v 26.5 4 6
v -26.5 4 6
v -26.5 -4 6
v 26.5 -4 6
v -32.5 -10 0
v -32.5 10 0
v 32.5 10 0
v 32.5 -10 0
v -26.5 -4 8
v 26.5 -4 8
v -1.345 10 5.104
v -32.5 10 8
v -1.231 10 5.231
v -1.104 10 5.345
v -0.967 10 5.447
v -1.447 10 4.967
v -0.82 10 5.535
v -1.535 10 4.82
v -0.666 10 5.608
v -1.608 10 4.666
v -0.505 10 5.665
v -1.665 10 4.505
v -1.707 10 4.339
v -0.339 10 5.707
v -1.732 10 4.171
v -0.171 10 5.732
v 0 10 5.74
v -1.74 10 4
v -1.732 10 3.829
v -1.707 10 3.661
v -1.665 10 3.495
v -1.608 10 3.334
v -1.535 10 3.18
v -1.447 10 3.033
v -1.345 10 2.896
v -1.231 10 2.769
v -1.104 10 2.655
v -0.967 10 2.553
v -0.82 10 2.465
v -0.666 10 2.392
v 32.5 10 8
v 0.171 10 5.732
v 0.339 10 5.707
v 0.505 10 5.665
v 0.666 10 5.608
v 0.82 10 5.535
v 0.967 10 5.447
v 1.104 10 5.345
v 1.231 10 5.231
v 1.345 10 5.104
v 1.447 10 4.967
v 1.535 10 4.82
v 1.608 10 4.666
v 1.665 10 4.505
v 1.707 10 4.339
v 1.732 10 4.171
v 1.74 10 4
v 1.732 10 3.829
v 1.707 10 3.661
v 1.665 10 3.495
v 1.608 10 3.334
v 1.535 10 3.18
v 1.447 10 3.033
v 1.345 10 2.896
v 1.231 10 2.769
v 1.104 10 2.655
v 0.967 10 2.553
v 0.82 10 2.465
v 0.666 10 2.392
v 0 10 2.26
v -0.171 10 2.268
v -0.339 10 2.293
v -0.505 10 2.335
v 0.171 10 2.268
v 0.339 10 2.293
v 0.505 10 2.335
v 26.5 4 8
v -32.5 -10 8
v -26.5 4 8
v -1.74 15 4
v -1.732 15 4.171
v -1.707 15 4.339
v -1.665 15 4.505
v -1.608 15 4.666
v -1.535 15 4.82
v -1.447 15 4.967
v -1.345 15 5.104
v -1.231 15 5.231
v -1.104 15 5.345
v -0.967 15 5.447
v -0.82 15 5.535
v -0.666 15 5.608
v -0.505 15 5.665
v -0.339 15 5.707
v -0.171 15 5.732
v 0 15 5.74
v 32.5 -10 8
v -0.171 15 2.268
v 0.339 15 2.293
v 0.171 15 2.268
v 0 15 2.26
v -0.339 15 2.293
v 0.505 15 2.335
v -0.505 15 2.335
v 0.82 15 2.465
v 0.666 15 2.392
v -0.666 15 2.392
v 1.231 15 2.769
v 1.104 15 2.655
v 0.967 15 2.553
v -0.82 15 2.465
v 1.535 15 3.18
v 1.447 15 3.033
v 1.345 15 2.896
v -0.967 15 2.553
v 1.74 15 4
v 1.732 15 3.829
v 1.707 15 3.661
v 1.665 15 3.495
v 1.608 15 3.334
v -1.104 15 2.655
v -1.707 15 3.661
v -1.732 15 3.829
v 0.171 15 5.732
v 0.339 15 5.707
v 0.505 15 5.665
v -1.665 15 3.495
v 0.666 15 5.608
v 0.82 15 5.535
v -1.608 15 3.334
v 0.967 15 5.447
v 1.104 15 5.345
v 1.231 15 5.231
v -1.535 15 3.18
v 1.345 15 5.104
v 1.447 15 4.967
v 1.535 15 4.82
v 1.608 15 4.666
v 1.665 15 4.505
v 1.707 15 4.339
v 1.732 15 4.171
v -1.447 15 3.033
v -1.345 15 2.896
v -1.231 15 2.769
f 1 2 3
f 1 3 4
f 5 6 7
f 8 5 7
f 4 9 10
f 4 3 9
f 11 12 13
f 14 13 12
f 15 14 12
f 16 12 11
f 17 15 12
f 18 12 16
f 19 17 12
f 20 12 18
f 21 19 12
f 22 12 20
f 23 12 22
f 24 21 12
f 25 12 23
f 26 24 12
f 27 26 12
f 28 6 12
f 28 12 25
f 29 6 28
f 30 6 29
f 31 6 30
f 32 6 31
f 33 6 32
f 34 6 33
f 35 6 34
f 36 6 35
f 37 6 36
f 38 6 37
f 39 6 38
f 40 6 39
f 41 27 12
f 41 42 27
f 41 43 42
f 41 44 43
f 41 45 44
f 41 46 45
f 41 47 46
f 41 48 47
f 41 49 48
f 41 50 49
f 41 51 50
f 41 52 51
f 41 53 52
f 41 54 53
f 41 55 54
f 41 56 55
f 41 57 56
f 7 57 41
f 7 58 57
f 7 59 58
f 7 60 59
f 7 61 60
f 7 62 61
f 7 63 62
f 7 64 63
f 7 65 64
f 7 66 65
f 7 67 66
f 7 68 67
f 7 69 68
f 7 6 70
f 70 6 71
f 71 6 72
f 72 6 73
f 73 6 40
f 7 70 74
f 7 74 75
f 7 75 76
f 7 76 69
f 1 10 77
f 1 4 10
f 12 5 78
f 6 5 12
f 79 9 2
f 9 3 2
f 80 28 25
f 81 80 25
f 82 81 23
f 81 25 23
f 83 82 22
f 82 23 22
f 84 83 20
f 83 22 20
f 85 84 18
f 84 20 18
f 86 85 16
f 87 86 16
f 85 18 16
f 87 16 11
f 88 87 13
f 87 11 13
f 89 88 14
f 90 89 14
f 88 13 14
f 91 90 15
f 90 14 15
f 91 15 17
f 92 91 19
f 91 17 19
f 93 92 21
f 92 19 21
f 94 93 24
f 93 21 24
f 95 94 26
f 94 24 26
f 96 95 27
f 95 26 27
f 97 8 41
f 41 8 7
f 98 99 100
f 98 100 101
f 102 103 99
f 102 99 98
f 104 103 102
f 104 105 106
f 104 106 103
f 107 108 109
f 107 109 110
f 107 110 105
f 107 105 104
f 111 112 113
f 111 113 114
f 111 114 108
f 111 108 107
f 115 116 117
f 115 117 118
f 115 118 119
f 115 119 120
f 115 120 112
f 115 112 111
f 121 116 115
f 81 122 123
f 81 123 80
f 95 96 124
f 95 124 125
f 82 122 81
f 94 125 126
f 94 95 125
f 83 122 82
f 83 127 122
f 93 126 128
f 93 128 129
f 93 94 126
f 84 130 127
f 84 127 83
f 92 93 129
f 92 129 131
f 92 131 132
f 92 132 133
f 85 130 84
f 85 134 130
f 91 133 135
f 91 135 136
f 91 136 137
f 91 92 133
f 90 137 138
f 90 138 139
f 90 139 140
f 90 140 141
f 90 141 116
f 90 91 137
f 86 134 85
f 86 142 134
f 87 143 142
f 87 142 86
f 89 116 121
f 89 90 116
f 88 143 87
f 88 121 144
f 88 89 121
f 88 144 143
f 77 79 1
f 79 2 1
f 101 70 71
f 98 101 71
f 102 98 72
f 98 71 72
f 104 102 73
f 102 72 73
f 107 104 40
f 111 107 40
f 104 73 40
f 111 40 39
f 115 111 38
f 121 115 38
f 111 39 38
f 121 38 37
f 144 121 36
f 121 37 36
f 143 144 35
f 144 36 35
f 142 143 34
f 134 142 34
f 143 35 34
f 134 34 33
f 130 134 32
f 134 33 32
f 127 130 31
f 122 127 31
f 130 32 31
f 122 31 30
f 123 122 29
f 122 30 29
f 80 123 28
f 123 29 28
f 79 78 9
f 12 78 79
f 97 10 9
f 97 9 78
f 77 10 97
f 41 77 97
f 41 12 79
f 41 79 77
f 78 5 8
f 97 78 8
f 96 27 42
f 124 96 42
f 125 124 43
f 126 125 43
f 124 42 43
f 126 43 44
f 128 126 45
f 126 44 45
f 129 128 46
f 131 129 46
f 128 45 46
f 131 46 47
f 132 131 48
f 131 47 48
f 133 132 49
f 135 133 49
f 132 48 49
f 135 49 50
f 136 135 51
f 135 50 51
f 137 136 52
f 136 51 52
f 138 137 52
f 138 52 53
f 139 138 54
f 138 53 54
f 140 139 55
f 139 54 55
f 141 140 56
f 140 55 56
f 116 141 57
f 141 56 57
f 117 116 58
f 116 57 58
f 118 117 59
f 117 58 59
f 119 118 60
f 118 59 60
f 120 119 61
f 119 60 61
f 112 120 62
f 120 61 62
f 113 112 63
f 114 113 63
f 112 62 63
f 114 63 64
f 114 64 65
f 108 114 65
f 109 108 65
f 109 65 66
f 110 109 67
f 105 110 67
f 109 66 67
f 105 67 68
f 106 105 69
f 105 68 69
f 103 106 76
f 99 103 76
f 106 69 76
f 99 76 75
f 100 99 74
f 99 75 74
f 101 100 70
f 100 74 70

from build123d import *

# Parameters (mm, degrees)
F0_W     = 65
F0_H     = 20
F1_DEPTH = 8
F2_T     = -6
F4_DEPTH = 5


with BuildPart() as f1:
    # F0 (on Top) → F1 (new body)
    with BuildSketch(Plane.XY):
        Rectangle(F0_W, F0_H)
    extrude(amount=F1_DEPTH)

    # F2
    f2_openings = [f1.faces().sort_by_distance(p)[0] for p in [
        (0, 0, 8),
    ]]
    offset(amount=F2_T, openings=f2_openings)

    # F3 (on face) → F4 (join)
    with BuildSketch(Plane(origin=(0, 10, 0), x_dir=(-1, 0, 0), z_dir=(0, 1, 0))):
        with BuildLine():
            ThreePointArc((1.740197, 4), (1.230505, 5.230505), (0, 5.740197))
            Line((0, 5.740197), (0, 4))
            Line((0, 4), (0, 2.259803))
            ThreePointArc((0, 2.259803), (1.230505, 2.769495), (1.740197, 4))
        make_face()
        with BuildLine():
            Line((0, 4), (0, 5.740197))
            ThreePointArc((0, 5.740197), (-1.740197, 4), (0, 2.259803))
            Line((0, 2.259803), (0, 4))
        make_face()
    extrude(amount=F4_DEPTH)


solid = f1.part
